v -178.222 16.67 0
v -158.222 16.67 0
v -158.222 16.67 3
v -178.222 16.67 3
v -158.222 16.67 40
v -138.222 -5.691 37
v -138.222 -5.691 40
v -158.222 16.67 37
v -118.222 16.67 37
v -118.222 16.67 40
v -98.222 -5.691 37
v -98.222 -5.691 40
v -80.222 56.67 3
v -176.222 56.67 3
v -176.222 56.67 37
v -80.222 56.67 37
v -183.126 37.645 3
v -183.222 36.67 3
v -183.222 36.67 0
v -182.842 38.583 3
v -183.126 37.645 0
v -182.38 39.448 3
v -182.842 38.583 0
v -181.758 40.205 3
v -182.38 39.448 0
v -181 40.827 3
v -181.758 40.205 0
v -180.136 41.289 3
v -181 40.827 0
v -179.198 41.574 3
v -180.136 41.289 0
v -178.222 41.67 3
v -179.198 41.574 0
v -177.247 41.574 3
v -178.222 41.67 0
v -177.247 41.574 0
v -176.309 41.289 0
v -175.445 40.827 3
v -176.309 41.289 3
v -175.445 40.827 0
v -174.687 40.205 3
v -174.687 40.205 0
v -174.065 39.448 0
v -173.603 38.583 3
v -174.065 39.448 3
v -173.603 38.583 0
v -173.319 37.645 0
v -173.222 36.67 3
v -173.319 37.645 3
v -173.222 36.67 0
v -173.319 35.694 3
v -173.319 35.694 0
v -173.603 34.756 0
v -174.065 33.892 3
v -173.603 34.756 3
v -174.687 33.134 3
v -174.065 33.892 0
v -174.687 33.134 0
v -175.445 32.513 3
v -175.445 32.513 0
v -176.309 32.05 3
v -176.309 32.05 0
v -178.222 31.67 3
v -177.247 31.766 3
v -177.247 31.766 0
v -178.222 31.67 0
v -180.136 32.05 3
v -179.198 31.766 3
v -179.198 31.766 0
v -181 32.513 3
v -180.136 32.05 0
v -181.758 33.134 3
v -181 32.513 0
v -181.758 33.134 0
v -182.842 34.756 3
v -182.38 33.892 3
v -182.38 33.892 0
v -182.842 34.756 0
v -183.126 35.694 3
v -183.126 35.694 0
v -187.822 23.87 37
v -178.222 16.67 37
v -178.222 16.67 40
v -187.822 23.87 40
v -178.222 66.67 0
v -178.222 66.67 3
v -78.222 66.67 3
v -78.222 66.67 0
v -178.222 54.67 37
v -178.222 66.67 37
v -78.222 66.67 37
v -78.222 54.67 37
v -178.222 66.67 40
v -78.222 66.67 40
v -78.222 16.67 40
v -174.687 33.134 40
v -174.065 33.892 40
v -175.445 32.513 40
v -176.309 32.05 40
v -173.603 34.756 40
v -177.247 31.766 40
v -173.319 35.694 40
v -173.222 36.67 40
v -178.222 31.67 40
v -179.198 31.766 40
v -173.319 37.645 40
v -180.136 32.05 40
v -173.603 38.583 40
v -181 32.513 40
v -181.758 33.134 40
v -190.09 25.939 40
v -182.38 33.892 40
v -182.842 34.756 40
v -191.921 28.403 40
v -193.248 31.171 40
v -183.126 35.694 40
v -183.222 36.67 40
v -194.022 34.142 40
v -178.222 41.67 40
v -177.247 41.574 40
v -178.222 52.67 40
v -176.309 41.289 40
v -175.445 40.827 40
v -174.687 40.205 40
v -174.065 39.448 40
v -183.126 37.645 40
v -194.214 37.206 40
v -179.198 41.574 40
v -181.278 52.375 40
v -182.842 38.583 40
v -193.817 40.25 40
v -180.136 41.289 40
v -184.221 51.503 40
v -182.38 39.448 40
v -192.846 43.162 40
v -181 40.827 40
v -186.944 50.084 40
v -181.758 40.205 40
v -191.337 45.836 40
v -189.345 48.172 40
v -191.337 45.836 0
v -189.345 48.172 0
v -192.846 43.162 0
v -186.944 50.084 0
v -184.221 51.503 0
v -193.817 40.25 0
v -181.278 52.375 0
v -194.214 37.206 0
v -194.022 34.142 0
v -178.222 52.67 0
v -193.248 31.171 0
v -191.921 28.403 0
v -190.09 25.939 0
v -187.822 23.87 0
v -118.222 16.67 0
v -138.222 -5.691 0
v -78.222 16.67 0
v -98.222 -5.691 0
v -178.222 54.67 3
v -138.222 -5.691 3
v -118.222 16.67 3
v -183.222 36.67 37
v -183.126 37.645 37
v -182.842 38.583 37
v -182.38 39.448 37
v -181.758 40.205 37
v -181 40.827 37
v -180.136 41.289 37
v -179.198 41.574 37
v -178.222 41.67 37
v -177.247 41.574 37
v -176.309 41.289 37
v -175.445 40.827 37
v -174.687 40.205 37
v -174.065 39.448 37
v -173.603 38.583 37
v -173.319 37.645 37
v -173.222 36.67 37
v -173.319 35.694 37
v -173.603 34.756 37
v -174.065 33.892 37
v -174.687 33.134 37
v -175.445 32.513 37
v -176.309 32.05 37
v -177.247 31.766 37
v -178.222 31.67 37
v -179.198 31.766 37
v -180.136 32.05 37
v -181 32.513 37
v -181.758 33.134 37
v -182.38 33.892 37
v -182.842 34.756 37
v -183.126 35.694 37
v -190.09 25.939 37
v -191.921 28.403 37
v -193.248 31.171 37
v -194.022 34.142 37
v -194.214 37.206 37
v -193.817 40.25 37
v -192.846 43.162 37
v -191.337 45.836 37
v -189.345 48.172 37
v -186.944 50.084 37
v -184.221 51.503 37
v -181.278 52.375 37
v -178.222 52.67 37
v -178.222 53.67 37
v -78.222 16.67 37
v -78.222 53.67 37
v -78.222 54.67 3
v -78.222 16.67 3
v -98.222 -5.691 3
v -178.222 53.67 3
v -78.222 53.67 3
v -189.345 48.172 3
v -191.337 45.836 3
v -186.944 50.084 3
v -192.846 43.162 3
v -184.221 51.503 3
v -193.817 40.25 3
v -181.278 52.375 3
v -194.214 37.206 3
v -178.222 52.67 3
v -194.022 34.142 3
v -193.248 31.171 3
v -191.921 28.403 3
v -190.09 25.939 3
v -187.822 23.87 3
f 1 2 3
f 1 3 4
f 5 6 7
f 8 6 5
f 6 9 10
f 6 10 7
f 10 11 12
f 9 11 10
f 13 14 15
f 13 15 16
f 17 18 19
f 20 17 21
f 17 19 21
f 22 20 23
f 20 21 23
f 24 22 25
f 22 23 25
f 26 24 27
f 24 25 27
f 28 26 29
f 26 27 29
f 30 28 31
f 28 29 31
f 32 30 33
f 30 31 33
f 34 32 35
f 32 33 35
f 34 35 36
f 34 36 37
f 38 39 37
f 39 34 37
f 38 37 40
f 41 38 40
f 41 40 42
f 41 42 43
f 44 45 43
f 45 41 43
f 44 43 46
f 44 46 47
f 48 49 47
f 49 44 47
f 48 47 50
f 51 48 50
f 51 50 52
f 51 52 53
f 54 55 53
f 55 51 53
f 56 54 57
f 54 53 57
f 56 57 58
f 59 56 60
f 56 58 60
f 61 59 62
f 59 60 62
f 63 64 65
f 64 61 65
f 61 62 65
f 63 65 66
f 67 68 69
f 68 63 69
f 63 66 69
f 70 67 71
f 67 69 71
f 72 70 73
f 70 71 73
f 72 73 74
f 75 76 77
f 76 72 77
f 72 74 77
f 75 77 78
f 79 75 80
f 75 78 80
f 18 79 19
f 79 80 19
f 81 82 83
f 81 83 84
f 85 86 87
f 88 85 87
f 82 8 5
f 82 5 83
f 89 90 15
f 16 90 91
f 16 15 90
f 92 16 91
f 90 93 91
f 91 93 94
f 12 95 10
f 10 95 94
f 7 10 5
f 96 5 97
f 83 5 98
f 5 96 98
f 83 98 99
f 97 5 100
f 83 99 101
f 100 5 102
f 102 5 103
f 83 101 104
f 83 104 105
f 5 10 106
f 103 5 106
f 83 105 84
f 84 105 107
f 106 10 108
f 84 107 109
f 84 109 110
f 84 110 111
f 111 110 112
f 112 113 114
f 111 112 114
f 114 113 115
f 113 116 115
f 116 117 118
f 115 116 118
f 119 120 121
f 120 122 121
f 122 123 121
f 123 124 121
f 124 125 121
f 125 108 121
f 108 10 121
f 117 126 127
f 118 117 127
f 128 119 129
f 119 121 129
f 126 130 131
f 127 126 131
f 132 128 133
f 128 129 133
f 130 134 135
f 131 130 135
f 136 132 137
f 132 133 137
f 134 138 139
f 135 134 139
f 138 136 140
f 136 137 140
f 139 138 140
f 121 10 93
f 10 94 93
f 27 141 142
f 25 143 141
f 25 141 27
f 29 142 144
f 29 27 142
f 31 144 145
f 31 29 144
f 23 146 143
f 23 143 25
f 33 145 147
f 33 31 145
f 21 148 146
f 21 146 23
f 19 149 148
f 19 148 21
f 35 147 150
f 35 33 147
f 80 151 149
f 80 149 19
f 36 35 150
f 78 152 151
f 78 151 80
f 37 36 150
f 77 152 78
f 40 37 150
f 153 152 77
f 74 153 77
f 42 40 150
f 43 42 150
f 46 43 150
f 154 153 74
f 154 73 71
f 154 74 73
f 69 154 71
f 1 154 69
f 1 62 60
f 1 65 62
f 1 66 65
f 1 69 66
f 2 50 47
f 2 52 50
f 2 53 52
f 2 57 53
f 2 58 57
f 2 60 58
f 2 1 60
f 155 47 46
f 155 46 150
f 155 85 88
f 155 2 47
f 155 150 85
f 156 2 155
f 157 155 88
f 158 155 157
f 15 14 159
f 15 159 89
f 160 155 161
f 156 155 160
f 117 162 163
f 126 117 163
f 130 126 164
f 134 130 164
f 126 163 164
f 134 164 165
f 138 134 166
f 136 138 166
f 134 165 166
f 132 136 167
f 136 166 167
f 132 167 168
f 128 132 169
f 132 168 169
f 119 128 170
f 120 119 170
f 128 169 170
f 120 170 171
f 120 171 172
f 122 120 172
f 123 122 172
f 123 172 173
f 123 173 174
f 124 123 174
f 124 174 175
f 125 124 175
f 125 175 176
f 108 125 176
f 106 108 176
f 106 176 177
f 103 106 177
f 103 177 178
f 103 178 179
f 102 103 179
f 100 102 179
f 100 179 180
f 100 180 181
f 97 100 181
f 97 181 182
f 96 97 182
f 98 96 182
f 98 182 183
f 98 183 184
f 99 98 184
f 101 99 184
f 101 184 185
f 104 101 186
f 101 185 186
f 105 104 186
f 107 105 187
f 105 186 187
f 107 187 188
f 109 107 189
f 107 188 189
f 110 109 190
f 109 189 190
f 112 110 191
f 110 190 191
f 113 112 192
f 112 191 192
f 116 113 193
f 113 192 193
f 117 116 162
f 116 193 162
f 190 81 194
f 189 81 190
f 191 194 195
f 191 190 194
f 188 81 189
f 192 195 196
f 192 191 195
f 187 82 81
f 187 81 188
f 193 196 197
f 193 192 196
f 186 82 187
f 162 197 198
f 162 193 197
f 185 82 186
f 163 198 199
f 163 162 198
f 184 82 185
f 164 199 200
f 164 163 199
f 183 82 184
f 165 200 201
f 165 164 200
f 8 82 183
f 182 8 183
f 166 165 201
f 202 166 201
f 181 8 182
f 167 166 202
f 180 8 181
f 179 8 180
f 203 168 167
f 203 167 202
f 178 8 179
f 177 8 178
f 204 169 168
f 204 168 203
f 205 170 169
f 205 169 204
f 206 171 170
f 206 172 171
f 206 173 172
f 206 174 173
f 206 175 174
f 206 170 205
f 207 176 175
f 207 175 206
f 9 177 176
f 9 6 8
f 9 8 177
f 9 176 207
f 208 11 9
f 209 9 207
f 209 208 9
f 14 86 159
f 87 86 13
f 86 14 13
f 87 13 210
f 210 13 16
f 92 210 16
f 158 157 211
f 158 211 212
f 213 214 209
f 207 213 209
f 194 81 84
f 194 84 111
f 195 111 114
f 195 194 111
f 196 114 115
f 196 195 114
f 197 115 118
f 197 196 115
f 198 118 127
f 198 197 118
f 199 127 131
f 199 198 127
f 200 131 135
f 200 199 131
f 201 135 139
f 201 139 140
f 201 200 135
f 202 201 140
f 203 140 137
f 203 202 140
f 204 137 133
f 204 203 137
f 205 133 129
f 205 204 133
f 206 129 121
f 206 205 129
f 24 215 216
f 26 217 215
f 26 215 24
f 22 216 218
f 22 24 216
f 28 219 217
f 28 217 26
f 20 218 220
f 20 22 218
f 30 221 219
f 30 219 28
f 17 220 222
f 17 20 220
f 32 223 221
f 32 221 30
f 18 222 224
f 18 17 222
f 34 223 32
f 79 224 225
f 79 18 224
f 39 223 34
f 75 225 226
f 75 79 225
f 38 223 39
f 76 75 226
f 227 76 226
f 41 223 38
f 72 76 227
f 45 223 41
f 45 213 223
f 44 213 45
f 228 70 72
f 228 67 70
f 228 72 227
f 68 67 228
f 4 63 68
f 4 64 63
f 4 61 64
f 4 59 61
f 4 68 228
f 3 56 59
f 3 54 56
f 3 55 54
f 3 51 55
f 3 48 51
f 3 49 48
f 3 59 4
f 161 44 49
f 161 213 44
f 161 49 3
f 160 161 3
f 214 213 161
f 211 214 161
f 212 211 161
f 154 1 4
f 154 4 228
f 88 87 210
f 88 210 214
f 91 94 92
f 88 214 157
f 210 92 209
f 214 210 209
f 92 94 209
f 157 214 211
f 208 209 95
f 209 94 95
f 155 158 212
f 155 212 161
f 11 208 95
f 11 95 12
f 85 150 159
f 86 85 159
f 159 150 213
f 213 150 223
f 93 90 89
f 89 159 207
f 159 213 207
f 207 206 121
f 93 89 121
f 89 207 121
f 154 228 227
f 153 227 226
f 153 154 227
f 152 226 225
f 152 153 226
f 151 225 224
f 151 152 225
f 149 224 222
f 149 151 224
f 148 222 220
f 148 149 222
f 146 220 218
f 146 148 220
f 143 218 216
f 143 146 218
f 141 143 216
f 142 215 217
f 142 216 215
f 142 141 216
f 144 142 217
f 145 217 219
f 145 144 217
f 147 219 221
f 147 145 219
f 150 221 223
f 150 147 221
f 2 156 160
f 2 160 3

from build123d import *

# Parameters (mm, degrees)
F0_R      = 5
F1_DEPTH  = 40
F5_W      = 100
F5_H      = 3
F6_DEPTH  = 28
F7_W      = 100
F7_H      = 3
F8_DEPTH  = 10
F7_H_2    = 40
F13_DEPTH = 116.001
F14_W     = 100
F14_H     = 3
F15_DEPTH = 10
F18_DEPTH = 40.001
F19_SIZE  = 2
F20_SIZE  = 2
F21_W     = 67.4691606036
F21_H     = 7
F22_DEPTH = 116.001


with BuildPart() as f1:
    # F0 (on Top) → F1 (new body)
    with BuildSketch(Plane.XY):
        with BuildLine():
            Line((21.777506699, 52.6698508731), (21.777506699, 56.6698508731))
            Line((21.777506699, 56.6698508731), (-78.222493301, 56.6698508731))
            Line((-78.222493301, 56.6698508731), (-78.222493301, 16.6698508731))
            Line((-78.222493301, 16.6698508731), (-58.222493301, -5.6908289019))
            Line((-58.222493301, -5.6908289019), (-38.222493301, 16.6698508731))
            Line((-38.222493301, 16.6698508731), (-18.222493301, -5.6908289019))
            Line((-18.222493301, -5.6908289019), (1.777506699, 16.6698508731))
            Line((1.777506699, 16.6698508731), (21.777506699, 16.6698508731))
            Line((21.777506699, 16.6698508731), (31.377506699, 23.8698508731))
            ThreePointArc((31.377506699, 23.8698508731), (36.9564394679, 41.7294951294), (21.777506699, 52.6698508731))
        make_face()
        with Locations((21.777506699, 36.6698508731)):
            Circle(F0_R, mode=Mode.SUBTRACT)
    extrude(amount=F1_DEPTH)


with BuildPart() as f2_1:
    # F2: copy of F1
    add(f1.part.moved(Location((0, 0, 28))))


with BuildPart() as f4_1:
    # F4: copy of F1
    add(f1.part.moved(Location((0, 0, 34))))


with BuildPart() as f6:
    # F5 (on face) → F6 (new body)
    with BuildSketch(Plane.XY.offset(40)):
        with Locations((-28.222493301, 55.1698508731)):
            Rectangle(F5_W, F5_H)
    extrude(amount=F6_DEPTH)


with BuildPart() as f8:
    # F7 (on face) → F8 (new body)
    with BuildSketch(Plane(origin=(0, 56.6698508731, 0), x_dir=(-1, 0, 0), z_dir=(0, 1, 0))):
        with Locations((28.222493301, 69.5)):
            Rectangle(F7_W, F7_H)
    extrude(amount=F8_DEPTH)


with BuildPart() as f8b:
    # F7 (on face) → F8, piece 2 (new body)
    with BuildSketch(Plane(origin=(0, 56.6698508731, 0), x_dir=(-1, 0, 0), z_dir=(0, 1, 0))):
        with Locations((28.222493301, 20)):
            Rectangle(F7_W, F7_H_2)
    extrude(amount=F8_DEPTH)


with BuildPart() as f1_1:
    add(f1.part)

    # F12 (on face) → F13 (cut, through all)
    with BuildSketch(Plane(origin=(-78.222493301, 0, 0), x_dir=(0, -1, 0), z_dir=(-1, 0, 0))):
        Polygon((15.5293103307, 30), (-53.6698508731, 30), (-53.6698508731, 3), (13.7041052803, 3), align=None)
    extrude(amount=-F13_DEPTH, mode=Mode.SUBTRACT)

    # F14 (on face) → F15 (join)
    with BuildSketch(Plane(origin=(0, 56.6698508731, 0), x_dir=(-1, 0, 0), z_dir=(0, 1, 0))):
        with Locations((28.222493301, 1.5)):
            Rectangle(F14_W, F14_H)
        with Locations((28.222493301, 38.5)):
            Rectangle(F14_W, F14_H)
    extrude(amount=F15_DEPTH)

    # F16: F1 across face


with BuildPart() as f1_2:
    add(f1_1.part)
    add(f1_1.part.mirror(Plane(origin=(-78.222493301, 41.2061594964, 25.2897125567), x_dir=(0, -1, 0), z_dir=(-1, 0, 0))))

    # F17 (on face) → F18 (cut, through all)
    with BuildSketch(Plane.XY.offset(40)):
        Polygon((-78.222493301, 86.7001339793), (-78.222493301, 16.6698508731), (-78.222493301, -27.7220606804), (68.2113543153, -27.7220606804), (68.2113543153, 86.7001339793), align=None)
    extrude(amount=-F18_DEPTH, mode=Mode.SUBTRACT)

    # F19
    f19_edges = [f1_2.edges().sort_by_distance(p)[0] for p in [
        (-178.222493, 56.669851, 20),
    ]]
    chamfer(f19_edges, length=F19_SIZE)

    # F20
    f20_edges = [f1_2.edges().sort_by_distance(p)[0] for p in [
        (-78.222493, 56.669851, 20),
    ]]
    chamfer(f20_edges, length=F20_SIZE)

    # F21 (on face) → F22 (cut, through all)
    with BuildSketch(Plane.YZ.offset(-78.222493301)):
        with Locations((19.9352705713, 33.5)):
            Rectangle(F21_W, F21_H)
    extrude(amount=-F22_DEPTH, mode=Mode.SUBTRACT)


solid = f1_2.part
